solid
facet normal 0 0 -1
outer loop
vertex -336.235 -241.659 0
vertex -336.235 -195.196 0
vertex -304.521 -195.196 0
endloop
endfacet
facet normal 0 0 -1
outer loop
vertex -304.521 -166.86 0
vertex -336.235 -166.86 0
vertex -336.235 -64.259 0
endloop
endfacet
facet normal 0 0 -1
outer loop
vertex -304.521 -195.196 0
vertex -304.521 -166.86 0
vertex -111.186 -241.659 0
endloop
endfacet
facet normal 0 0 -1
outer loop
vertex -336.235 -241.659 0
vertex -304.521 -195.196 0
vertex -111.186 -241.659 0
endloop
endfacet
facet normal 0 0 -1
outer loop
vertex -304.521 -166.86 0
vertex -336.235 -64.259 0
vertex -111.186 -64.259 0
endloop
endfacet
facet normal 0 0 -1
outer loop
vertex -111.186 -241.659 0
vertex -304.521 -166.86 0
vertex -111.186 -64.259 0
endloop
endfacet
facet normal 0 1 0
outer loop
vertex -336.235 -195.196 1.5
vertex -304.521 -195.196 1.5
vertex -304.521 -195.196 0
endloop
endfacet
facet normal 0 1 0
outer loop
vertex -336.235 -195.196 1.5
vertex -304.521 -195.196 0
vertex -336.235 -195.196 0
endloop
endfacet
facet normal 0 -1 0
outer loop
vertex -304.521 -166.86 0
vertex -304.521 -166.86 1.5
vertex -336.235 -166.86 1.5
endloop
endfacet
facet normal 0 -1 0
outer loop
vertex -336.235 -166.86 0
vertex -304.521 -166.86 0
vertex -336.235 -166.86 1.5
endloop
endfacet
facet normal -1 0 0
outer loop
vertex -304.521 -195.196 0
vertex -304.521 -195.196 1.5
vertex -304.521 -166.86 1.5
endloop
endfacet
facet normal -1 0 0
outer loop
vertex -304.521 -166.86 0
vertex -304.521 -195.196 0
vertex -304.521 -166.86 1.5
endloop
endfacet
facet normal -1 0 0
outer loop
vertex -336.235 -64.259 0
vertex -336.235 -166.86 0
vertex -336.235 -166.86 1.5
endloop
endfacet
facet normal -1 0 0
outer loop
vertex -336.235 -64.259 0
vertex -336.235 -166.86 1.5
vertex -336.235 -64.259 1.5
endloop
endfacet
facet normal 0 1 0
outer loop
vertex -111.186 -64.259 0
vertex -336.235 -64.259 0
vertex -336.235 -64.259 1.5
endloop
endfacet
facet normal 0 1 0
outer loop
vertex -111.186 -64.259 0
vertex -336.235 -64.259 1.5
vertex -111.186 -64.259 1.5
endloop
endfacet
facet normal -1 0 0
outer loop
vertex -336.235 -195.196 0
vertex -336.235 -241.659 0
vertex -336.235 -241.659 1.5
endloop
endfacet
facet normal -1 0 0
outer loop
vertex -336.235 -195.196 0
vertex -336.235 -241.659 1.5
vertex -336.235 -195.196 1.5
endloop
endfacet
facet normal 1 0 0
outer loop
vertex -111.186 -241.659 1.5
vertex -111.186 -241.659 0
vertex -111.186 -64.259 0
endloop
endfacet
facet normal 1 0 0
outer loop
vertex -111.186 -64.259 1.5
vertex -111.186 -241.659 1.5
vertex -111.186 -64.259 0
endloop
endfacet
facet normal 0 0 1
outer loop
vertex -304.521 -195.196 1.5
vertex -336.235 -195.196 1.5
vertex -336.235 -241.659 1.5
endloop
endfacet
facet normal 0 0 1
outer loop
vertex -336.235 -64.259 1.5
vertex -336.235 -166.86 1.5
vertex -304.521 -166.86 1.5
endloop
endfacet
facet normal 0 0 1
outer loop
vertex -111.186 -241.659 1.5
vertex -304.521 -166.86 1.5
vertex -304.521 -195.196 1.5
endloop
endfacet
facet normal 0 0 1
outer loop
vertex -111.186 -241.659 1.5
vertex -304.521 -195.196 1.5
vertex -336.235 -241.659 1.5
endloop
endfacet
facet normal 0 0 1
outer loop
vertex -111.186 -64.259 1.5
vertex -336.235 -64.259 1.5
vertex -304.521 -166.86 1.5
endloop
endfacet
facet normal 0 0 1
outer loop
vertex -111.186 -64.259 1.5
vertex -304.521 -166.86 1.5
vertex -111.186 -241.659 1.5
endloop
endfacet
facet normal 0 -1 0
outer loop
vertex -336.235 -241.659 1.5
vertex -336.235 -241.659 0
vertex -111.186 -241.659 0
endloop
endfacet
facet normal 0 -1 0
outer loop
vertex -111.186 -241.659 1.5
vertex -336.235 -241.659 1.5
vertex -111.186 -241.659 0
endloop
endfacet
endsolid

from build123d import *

# Parameters (mm, degrees)
SKETCH1_W               = 225.049134978
SKETCH1_H               = 177.4
BOSS_EXTRUDE1_DEPTH     = 1.5
CUT_EXTRUDE1_DEPTH      = 415.071536001
CUT_EXTRUDE1_DEPTH_BACK = 415.071536001
SKETCH2_W               = 37.712350792
SKETCH2_H               = 28.336351977


with BuildPart() as part:
    # Sketch1 → Boss-Extrude1 (new body)
    with BuildSketch(Plane.XY):
        with Locations((-223.710369918, -152.958961749)):
            Rectangle(SKETCH1_W, SKETCH1_H)
    extrude(amount=BOSS_EXTRUDE1_DEPTH)

    # Sketch2 → Cut-Extrude1 (cut, two sides: drawn at the far end of the back side and taken through both)
    with BuildSketch(Plane(origin=(0, 0, 0), x_dir=(-1, 0, 0), z_dir=(0, 0, -1)).offset(-CUT_EXTRUDE1_DEPTH_BACK)):
        with Locations((323.377350572, -181.028114896)):
            Rectangle(SKETCH2_W, SKETCH2_H)
    extrude(amount=CUT_EXTRUDE1_DEPTH + CUT_EXTRUDE1_DEPTH_BACK, mode=Mode.SUBTRACT)


solid = part.part
